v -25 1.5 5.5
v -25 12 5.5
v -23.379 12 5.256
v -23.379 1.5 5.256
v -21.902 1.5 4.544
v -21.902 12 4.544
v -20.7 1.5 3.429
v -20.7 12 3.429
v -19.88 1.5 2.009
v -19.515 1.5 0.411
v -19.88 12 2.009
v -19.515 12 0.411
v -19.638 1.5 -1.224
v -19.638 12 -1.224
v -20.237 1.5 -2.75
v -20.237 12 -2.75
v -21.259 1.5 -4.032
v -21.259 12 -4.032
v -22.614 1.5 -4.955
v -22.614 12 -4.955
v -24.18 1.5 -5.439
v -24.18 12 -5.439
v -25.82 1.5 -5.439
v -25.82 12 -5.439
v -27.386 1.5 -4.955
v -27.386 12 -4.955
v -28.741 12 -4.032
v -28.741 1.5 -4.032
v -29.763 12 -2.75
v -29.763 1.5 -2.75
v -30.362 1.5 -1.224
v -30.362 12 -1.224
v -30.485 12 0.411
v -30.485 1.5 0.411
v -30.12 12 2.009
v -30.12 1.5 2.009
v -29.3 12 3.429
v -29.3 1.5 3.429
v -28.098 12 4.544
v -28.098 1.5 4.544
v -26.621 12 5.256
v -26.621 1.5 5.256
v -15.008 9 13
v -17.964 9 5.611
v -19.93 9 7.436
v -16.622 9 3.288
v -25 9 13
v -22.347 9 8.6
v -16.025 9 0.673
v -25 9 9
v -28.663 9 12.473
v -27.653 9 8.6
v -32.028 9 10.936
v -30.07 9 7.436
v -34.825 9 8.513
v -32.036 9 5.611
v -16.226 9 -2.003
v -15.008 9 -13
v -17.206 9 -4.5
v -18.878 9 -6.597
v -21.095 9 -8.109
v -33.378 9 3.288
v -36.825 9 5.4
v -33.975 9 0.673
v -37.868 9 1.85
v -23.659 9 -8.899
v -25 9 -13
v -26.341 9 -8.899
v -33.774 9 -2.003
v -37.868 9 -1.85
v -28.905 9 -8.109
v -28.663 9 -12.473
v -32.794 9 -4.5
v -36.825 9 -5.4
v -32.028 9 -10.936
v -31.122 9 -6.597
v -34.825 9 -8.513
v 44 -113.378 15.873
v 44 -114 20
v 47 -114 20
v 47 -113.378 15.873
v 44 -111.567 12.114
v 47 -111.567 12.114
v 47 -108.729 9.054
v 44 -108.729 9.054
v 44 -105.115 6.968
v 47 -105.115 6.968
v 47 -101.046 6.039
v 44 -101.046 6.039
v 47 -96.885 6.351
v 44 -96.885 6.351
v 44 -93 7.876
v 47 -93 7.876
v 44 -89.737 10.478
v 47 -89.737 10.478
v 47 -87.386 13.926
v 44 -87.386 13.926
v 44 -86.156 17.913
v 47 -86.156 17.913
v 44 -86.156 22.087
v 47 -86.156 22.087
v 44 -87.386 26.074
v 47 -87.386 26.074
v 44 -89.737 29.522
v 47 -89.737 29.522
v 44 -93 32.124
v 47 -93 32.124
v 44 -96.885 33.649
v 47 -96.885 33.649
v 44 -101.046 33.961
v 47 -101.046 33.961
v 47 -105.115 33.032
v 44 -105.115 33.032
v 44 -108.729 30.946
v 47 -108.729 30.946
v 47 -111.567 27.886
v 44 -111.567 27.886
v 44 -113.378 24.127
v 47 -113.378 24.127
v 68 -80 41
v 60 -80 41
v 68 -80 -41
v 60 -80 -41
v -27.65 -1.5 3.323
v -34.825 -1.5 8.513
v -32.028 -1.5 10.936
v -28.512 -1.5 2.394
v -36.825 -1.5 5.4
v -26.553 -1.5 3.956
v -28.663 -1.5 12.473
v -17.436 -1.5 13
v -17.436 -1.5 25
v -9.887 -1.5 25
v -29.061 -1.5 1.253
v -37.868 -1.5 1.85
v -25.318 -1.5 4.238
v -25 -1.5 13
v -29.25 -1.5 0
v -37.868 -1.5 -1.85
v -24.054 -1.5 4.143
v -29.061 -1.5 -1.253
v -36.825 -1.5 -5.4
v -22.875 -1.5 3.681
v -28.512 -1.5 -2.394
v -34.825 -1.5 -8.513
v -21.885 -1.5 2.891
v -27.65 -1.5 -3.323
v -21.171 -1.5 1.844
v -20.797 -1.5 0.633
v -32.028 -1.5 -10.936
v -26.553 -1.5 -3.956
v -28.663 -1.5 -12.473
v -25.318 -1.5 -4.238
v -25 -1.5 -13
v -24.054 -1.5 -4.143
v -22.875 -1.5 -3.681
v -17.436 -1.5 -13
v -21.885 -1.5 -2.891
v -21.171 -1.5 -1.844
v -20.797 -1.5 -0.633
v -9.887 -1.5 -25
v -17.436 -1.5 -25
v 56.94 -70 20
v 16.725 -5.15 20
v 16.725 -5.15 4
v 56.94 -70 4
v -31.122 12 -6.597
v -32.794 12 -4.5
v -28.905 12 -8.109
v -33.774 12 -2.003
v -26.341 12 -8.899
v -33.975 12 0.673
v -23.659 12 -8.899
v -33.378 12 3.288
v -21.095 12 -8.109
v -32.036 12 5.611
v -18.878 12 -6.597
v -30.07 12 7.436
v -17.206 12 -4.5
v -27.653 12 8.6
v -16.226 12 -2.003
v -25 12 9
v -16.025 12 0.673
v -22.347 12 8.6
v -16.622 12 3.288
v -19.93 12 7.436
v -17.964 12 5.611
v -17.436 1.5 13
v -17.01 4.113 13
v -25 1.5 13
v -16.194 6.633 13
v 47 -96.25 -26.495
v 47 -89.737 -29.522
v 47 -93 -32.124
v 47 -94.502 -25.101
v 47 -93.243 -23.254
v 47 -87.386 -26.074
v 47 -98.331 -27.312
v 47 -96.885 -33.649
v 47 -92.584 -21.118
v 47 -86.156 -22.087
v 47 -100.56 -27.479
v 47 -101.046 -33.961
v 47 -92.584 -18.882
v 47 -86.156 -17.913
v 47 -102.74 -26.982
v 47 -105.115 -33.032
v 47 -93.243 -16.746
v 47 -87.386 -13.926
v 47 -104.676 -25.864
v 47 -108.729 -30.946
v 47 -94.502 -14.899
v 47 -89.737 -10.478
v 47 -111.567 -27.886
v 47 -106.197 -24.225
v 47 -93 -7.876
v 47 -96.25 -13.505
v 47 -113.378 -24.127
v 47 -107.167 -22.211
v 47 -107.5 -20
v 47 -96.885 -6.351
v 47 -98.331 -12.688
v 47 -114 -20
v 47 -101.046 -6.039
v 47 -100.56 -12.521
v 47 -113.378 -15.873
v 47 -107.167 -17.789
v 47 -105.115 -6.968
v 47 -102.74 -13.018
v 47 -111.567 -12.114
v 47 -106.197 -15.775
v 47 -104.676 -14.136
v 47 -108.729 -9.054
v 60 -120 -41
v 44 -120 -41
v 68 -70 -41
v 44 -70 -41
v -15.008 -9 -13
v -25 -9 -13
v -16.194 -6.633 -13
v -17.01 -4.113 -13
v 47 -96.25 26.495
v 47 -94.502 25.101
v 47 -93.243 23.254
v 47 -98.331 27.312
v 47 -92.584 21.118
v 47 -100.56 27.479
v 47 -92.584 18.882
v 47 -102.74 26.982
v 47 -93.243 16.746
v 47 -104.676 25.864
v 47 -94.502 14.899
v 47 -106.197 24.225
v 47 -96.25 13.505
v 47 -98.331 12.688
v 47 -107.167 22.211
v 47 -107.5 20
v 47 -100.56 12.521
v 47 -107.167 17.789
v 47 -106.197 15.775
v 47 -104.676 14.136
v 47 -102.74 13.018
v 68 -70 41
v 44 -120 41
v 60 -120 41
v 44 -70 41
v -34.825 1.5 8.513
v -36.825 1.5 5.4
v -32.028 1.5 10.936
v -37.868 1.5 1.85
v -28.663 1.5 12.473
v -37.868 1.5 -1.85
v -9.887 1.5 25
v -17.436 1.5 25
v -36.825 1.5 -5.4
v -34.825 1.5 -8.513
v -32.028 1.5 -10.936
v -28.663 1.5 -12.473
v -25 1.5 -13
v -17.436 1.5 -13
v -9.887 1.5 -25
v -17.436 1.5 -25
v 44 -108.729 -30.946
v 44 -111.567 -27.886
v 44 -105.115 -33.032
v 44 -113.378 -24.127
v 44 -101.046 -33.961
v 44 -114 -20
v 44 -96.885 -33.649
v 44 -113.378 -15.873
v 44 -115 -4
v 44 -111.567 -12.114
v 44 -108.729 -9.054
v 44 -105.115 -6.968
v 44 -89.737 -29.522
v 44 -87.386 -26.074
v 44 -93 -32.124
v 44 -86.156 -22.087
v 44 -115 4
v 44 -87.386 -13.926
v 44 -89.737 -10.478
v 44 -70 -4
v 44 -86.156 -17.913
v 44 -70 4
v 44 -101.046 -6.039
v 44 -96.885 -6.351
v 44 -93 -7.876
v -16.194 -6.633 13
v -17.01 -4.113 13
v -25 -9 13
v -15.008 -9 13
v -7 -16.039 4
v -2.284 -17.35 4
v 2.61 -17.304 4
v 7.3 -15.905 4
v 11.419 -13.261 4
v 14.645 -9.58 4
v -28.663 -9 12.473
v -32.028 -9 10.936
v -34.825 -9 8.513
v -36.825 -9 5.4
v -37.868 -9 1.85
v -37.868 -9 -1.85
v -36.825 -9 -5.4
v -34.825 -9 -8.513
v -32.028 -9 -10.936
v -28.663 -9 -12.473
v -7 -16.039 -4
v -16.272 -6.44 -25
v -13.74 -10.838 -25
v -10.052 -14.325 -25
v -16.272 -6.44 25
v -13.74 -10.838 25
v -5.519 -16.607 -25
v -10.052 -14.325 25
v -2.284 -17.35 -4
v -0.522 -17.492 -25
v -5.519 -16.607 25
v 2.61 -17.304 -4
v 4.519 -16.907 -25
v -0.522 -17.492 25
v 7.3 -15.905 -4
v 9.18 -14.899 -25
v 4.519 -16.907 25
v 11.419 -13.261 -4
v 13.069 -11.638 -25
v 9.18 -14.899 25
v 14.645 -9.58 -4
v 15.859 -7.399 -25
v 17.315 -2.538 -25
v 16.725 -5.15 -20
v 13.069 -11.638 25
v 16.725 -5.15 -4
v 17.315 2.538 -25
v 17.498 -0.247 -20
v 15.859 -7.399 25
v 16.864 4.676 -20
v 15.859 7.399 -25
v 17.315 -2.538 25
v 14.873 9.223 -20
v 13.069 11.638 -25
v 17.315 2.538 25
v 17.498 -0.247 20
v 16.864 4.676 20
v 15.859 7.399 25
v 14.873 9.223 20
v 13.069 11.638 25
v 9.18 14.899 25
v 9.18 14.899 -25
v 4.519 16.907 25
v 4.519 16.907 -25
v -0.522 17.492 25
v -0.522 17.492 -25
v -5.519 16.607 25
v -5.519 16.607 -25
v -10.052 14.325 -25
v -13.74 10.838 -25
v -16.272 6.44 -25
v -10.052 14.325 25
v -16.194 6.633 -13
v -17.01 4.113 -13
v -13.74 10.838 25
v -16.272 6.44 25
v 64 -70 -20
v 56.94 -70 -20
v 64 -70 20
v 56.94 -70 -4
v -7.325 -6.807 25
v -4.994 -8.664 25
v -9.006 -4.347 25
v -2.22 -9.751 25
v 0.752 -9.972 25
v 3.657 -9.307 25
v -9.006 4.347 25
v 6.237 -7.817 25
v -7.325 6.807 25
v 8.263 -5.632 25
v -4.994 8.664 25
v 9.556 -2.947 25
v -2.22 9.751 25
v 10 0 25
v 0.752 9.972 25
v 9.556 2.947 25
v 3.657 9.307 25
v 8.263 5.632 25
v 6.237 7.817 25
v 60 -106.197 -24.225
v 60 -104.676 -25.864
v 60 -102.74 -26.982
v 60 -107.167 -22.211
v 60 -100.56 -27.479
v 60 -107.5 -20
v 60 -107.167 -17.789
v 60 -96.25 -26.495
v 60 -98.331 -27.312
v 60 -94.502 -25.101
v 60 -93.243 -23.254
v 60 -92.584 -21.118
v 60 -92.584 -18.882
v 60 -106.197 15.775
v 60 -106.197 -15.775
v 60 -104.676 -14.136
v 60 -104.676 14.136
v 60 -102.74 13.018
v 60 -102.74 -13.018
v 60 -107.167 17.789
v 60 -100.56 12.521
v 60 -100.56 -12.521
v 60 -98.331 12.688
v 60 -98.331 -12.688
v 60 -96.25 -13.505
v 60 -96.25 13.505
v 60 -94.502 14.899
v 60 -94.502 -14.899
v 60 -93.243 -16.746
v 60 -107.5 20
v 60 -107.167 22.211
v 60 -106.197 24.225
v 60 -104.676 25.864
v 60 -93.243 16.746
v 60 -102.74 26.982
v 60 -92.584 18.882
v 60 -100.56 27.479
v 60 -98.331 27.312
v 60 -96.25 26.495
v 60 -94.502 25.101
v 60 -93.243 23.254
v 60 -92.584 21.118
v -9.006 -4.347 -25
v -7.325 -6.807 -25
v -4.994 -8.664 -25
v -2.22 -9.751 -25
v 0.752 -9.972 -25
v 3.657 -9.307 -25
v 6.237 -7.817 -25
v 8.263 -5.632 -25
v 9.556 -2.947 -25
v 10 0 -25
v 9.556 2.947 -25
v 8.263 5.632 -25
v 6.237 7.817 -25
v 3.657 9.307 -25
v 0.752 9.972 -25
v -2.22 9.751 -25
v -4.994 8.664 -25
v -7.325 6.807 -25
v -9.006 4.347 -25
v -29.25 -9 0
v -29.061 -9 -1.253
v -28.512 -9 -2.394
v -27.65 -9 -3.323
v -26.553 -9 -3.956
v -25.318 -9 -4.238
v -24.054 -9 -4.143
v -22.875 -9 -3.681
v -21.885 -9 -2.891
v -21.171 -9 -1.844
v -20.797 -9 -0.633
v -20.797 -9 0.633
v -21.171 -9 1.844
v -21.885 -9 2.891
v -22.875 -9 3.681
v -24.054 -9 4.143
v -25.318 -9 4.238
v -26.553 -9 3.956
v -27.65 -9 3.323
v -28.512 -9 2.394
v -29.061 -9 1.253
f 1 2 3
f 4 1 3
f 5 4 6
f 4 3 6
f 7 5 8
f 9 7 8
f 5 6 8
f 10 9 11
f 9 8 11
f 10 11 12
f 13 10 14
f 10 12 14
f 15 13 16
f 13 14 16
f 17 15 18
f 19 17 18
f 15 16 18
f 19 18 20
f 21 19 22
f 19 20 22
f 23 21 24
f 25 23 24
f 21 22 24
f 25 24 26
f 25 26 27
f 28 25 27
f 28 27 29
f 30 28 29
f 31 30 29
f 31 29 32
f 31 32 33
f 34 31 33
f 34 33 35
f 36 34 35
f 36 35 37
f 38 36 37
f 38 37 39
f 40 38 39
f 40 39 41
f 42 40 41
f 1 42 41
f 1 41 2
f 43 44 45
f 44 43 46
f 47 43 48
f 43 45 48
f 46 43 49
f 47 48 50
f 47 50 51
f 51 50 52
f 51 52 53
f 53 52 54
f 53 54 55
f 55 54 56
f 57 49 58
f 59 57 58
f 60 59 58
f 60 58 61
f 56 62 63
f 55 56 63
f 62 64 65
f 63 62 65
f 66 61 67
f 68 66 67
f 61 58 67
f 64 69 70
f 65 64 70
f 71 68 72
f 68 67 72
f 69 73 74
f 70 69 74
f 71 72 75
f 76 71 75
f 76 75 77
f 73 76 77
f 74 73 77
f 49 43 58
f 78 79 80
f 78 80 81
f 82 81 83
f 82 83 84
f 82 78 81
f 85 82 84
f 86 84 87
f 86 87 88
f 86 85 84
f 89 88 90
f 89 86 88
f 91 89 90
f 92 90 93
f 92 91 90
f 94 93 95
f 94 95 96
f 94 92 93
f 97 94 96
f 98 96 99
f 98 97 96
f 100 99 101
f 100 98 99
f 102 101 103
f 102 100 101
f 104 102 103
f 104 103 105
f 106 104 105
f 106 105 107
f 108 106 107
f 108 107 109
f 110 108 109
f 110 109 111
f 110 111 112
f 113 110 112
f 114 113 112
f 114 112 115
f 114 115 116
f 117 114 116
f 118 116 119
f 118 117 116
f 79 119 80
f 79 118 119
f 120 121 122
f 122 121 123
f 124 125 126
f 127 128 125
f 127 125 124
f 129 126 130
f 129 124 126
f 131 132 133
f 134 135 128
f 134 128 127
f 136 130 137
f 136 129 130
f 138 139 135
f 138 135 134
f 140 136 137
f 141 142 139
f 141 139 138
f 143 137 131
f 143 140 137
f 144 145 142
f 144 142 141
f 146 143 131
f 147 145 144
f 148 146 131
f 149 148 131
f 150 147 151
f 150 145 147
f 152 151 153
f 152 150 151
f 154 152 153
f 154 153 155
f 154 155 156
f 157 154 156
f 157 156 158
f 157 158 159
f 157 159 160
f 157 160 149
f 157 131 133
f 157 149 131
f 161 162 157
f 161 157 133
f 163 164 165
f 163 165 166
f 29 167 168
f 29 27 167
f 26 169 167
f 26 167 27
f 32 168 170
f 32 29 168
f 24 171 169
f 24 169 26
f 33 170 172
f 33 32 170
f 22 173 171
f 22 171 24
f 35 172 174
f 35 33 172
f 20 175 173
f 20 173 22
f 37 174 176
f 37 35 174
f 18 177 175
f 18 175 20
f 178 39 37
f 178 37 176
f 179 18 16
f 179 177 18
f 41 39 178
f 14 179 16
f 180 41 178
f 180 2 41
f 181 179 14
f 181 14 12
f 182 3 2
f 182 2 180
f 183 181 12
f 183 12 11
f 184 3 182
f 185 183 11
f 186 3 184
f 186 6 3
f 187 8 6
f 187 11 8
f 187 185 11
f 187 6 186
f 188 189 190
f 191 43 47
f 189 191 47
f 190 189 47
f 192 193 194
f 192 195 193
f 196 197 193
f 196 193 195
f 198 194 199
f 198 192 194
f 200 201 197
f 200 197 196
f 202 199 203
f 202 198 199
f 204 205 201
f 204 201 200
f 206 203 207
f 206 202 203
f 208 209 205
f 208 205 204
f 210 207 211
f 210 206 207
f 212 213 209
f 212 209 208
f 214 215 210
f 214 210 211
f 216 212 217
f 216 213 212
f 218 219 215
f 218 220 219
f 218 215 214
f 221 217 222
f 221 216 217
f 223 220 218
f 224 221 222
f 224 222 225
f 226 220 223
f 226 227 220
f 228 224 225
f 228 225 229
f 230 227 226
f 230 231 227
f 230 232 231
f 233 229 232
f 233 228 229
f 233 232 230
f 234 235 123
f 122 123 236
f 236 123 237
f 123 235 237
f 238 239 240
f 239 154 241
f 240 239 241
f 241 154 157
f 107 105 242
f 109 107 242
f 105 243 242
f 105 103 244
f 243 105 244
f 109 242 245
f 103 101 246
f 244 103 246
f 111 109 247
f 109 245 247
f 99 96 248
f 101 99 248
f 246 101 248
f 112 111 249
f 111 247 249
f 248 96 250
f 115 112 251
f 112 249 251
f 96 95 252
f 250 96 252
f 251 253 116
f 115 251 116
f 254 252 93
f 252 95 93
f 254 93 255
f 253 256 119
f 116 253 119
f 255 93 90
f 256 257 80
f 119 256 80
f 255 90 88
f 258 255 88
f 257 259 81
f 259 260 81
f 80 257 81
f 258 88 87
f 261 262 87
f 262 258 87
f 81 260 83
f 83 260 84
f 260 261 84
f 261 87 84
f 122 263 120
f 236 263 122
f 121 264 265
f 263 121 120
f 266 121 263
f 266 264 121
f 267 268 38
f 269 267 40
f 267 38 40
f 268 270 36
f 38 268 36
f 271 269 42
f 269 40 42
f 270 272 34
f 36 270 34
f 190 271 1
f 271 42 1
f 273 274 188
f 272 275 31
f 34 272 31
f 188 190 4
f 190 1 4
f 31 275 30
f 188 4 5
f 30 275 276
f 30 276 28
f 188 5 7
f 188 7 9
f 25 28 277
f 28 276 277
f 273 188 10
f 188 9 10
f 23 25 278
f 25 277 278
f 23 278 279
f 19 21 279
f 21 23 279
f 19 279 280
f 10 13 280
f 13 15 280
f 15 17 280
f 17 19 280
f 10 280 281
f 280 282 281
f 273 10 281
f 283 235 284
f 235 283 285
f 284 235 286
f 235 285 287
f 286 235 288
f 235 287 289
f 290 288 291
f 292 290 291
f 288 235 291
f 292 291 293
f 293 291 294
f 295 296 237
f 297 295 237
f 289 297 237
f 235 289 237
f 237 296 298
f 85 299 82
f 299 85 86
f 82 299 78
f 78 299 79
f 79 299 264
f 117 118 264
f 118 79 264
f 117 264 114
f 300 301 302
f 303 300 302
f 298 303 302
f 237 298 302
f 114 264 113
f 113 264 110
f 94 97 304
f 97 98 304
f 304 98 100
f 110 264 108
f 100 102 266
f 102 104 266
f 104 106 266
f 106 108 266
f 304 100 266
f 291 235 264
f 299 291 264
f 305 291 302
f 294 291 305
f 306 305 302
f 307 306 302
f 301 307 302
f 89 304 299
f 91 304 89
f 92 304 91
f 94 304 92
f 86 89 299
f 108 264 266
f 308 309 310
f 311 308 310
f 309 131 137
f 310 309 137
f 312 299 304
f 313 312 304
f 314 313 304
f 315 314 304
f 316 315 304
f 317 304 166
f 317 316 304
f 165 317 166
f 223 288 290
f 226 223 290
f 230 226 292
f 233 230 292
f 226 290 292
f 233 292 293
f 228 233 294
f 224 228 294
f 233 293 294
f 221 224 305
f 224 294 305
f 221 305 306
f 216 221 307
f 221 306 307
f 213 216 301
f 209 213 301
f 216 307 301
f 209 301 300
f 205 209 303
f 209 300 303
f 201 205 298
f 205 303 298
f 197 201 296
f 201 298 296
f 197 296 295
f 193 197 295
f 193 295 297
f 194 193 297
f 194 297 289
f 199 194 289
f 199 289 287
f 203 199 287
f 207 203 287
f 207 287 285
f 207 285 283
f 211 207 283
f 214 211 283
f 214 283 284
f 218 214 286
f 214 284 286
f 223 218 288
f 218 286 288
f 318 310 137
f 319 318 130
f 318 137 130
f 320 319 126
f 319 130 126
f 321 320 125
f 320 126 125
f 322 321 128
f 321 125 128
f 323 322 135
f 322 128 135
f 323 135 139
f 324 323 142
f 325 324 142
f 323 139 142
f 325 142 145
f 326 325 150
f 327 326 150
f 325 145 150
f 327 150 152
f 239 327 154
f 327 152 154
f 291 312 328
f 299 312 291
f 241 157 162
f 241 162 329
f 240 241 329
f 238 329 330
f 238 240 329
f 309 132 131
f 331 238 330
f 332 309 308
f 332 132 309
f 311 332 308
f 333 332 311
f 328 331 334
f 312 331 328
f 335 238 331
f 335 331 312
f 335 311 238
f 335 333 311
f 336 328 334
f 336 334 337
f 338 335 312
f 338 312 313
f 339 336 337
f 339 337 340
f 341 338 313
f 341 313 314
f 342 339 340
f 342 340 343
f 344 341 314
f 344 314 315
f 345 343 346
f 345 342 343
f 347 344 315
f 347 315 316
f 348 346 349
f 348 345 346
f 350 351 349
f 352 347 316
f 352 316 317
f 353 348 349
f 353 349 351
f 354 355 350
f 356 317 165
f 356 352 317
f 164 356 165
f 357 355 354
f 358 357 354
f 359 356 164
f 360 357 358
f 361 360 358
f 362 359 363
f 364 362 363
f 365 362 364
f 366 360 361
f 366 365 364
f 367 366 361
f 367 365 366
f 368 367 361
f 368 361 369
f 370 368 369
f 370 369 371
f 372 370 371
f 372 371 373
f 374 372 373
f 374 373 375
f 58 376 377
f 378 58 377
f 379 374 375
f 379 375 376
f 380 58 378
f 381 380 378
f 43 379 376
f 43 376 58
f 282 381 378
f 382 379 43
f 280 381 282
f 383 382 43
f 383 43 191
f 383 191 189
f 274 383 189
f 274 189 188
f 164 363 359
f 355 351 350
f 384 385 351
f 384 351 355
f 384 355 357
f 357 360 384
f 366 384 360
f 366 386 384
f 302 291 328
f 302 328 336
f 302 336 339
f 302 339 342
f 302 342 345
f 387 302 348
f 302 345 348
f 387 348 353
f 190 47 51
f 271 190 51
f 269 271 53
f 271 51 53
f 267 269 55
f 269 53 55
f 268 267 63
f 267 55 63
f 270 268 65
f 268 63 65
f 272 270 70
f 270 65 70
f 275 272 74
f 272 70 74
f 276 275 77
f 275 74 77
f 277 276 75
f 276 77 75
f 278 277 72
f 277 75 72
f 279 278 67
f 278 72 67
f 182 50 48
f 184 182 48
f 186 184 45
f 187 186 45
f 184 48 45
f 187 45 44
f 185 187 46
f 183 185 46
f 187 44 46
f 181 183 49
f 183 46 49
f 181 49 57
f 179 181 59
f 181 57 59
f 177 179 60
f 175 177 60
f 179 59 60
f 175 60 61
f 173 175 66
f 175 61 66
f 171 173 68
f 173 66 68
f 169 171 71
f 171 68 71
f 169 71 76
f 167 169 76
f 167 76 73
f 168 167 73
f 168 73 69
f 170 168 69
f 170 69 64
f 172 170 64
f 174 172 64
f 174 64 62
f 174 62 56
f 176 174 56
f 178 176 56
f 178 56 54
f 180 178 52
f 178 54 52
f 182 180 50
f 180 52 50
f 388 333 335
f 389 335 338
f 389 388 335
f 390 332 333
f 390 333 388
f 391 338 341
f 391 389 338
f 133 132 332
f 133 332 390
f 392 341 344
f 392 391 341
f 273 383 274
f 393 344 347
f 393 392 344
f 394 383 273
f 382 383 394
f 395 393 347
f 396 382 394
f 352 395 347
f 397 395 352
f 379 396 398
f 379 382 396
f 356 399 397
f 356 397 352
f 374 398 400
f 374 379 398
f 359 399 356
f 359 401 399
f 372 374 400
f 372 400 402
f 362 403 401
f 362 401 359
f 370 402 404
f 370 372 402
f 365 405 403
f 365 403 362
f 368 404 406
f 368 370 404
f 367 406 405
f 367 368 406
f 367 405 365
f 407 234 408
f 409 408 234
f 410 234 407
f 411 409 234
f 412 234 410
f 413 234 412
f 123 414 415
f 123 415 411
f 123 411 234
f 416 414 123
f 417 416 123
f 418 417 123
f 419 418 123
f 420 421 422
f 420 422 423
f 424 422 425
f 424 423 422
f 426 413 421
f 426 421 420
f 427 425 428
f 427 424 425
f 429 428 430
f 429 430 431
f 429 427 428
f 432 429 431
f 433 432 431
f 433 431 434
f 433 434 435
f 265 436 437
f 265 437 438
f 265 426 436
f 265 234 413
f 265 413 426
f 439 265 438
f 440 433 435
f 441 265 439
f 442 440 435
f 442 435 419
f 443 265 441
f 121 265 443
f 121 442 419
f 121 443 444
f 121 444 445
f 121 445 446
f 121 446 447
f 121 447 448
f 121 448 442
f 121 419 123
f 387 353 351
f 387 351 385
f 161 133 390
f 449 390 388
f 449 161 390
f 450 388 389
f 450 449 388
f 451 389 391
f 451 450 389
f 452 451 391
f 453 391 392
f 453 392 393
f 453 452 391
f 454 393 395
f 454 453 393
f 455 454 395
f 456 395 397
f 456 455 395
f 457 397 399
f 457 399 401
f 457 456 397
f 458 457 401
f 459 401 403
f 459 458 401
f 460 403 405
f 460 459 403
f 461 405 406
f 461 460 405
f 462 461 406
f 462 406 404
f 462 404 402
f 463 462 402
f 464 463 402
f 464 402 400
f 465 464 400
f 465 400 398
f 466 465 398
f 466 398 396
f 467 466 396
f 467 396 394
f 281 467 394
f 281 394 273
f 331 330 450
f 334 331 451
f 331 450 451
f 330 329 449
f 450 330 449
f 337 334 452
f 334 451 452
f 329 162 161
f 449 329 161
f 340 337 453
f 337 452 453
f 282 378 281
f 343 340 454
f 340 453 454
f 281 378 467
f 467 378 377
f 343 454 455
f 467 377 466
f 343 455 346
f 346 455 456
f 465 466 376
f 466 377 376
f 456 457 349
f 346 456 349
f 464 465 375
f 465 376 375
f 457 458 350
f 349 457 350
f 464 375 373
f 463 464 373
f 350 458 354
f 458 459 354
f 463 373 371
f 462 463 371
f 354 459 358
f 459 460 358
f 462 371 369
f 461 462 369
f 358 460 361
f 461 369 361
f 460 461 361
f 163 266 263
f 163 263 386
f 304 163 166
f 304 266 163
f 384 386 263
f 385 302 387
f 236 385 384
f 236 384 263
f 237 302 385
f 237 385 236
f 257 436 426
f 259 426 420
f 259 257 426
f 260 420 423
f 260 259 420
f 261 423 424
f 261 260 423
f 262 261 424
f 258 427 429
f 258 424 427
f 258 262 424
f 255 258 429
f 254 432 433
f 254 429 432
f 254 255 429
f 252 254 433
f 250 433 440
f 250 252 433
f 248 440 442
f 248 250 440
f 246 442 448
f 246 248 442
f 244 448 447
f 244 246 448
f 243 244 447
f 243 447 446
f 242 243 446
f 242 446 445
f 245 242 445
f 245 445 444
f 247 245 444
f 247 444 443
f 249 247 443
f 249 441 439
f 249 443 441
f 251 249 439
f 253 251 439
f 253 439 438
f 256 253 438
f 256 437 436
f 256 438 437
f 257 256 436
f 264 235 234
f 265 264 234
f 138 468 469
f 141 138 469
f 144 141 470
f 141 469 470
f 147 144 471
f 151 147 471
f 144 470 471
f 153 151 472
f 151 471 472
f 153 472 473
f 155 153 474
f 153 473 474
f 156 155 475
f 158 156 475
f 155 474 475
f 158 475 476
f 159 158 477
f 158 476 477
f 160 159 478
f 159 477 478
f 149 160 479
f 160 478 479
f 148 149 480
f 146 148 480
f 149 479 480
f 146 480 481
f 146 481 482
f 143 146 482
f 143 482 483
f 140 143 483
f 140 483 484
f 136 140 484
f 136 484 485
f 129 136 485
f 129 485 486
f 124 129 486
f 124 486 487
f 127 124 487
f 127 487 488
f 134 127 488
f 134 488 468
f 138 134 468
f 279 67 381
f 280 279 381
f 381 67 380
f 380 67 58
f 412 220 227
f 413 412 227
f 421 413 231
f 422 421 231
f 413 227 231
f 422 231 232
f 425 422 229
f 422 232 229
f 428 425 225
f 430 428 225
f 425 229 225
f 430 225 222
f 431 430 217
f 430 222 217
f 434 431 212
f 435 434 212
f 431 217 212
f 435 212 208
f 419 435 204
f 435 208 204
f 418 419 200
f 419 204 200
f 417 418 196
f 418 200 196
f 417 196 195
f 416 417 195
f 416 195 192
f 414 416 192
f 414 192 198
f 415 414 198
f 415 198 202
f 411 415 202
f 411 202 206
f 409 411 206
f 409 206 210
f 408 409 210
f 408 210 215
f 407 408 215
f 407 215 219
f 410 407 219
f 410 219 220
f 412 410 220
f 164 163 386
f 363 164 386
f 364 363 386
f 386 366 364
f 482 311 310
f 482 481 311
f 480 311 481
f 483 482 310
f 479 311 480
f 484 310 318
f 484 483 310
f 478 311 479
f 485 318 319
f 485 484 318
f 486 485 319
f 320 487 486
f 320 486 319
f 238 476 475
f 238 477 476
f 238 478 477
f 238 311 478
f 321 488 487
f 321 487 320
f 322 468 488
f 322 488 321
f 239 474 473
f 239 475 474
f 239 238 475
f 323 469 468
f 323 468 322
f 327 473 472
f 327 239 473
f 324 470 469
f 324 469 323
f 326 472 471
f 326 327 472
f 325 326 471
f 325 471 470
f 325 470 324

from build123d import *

# Parameters (mm, degrees)
SKETCH_1_R               = 17.5
EXTRUDE_1_DEPTH          = 25
EXTRUDE_2_DEPTH          = 9
SKETCH_3_R               = 9
EXTRUDE_3_DEPTH          = 3
CUT_EXTRUDE_1_DEPTH      = 49.736536602
CUT_EXTRUDE_1_DEPTH_BACK = 49.736536602
SKETCH_4_W               = 40.777628878
SKETCH_4_H               = 3
CUT_EXTRUDE_2_DEPTH      = 66.193941436
CUT_EXTRUDE_2_DEPTH_BACK = 66.193941436
SKETCH_5_R               = 10
CUT_EXTRUDE_3_REACH      = 56.215
SKETCH_6_R               = 5.5
HOLE_WIZARD_M10_1_D      = 8.5
SKETCH_9_W               = 16
SKETCH_9_H               = 50
EXTRUDE_4_DEPTH          = 41
SKETCH_10_W              = 82
SKETCH_10_H              = 10
EXTRUDE_5_DEPTH          = 8
EXTRUDE_6_DEPTH          = 4
EXTRUDE_7_DEPTH          = 20
SKETCH_13_R              = 14
CUT_EXTRUDE_4_DEPTH      = 3
SKETCH_14_R              = 7.5
CUT_EXTRUDE_5_DEPTH      = 153.663027613


with BuildPart() as part:
    # 草图1 → 凸台-拉伸1 (new, symmetric)
    with BuildSketch(Plane.XY):
        Circle(SKETCH_1_R)
    extrude(amount=EXTRUDE_1_DEPTH, both=True)

    # 草图2 → 凸台-拉伸2 (add, symmetric)
    with BuildSketch(Plane(origin=(0, 0, 0), x_dir=(1, 0, 0), z_dir=(0, 1, 0))):
        with BuildLine():
            Line((0, -13), (-25, -13))
            ThreePointArc((-25, -13), (-38, 0), (-25, 13))
            Line((-25, 13), (0, 13))
            ThreePointArc((0, 13), (13, 0), (0, -13))
        make_face()
    extrude(amount=EXTRUDE_2_DEPTH, both=True)

    # 草图3 → 凸台-拉伸3 (add)
    with BuildSketch(Plane(origin=(0, 9, 0), x_dir=(1, 0, 0), z_dir=(0, 1, 0))):
        with Locations(Location((-25, 0, 0), (0, 0, 270))):
            Circle(SKETCH_3_R)
    extrude(amount=EXTRUDE_3_DEPTH)

    # 草图4 → 切除-拉伸1 (cut, two sides: drawn at the far end of the back side and taken through both)
    with BuildSketch(Plane.XY.offset(-CUT_EXTRUDE_1_DEPTH_BACK)):
        with Locations((-20.388814439, 0)):
            Rectangle(SKETCH_4_W, SKETCH_4_H)
    extrude(amount=CUT_EXTRUDE_1_DEPTH + CUT_EXTRUDE_1_DEPTH_BACK, mode=Mode.SUBTRACT)

    # 草图5 → 切除-拉伸2 (cut, two sides: drawn at the far end of the back side and taken through both)
    with BuildSketch(Plane.XY.offset(25).offset(-CUT_EXTRUDE_2_DEPTH_BACK)):
        Circle(SKETCH_5_R)
    extrude(amount=CUT_EXTRUDE_2_DEPTH + CUT_EXTRUDE_2_DEPTH_BACK, mode=Mode.SUBTRACT)

    # 草图6 → 切除-拉伸3 (cut, up to next)
    with BuildSketch(Plane(origin=(0, 12, 0), x_dir=(1, 0, 0), z_dir=(0, 1, 0)), mode=Mode.PRIVATE) as cut_extrude_3_sk1:
        with Locations(Location((-25, 0, 0), (0, 0, 270))):
            Circle(SKETCH_6_R)
    cut_extrude_3_tool1 = extrude(cut_extrude_3_sk1.sketch, amount=-CUT_EXTRUDE_3_REACH, mode=Mode.PRIVATE) & part.part
    add(cut_extrude_3_tool1.solids().sort_by_distance((-25, 12, 0))[0], mode=Mode.SUBTRACT)

    # M10 螺纹孔1 (through all)
    with Locations(Plane(origin=(0, -1.5, 0), x_dir=(1, 0, 0), z_dir=(0, 1, 0))):
        with Locations((-25, 0)):
            Hole(HOLE_WIZARD_M10_1_D / 2)



with BuildPart() as body_2:
    # 草图9 → 凸台-拉伸4 (new, symmetric)
    with BuildSketch(Plane.XY):
        with Locations((52, -95)):
            Rectangle(SKETCH_9_W, SKETCH_9_H)
    extrude(amount=EXTRUDE_4_DEPTH, both=True)

    # 草图10 → 凸台-拉伸5 (add)
    with BuildSketch(Plane(origin=(60, 0, 0), x_dir=(0, 0, -1), z_dir=(1, 0, 0))):
        with Locations((0, -75)):
            Rectangle(SKETCH_10_W, SKETCH_10_H)
    extrude(amount=EXTRUDE_5_DEPTH)


with BuildPart() as part_1:
    add(part.part)

    add(body_2.part)  # 凸台-拉伸6 merges body 2
    # 草图11 → 凸台-拉伸6 (add, symmetric)
    with BuildSketch(Plane.XY):
        with BuildLine():
            Line((-7, -16.039014932), (44, -115))
            Line((44, -115), (44, -70))
            Line((44, -70), (64, -70))
            Line((64, -70), (14.872506114, 9.222719875))
            ThreePointArc((14.872506114, 9.222719875), (13.229999981, -11.455003295), (-7, -16.039014932))
        make_face()
    extrude(amount=EXTRUDE_6_DEPTH, both=True)

    # 草图12 → 凸台-拉伸7 (add, symmetric)
    with BuildSketch(Plane.XY):
        with BuildLine():
            Line((64, -70), (14.872506114, 9.222719875))
            ThreePointArc((14.872506114, 9.222719875), (17.356401201, 2.237261127), (16.725134335, -5.149745768))
            Line((16.725134335, -5.149745768), (56.939992816, -70))
            Line((56.939992816, -70), (64, -70))
        make_face()
    extrude(amount=EXTRUDE_7_DEPTH, both=True)

    # 草图13 → 切除-拉伸4 (cut)
    with BuildSketch(Plane.ZY.offset(-44)):
        with Locations(Location((-20, -100, 0), (0, 0, 270))):
            Circle(SKETCH_13_R)
    cut_extrude_4 = extrude(amount=-CUT_EXTRUDE_4_DEPTH, mode=Mode.SUBTRACT)

    # 草图14 → 切除-拉伸5 (cut, through all)
    with BuildSketch(Plane.ZY.offset(-47)):
        with Locations(Location((-20, -100, 0), (0, 0, 270))):
            Circle(SKETCH_14_R)
    cut_extrude_5 = extrude(amount=-CUT_EXTRUDE_5_DEPTH, mode=Mode.SUBTRACT)

    # 镜向1: 切除-拉伸4, 切除-拉伸5 across plane
    add(cut_extrude_4.mirror(Plane.XY), mode=Mode.SUBTRACT)
    add(cut_extrude_5.mirror(Plane.XY), mode=Mode.SUBTRACT)


solid = part_1.part
